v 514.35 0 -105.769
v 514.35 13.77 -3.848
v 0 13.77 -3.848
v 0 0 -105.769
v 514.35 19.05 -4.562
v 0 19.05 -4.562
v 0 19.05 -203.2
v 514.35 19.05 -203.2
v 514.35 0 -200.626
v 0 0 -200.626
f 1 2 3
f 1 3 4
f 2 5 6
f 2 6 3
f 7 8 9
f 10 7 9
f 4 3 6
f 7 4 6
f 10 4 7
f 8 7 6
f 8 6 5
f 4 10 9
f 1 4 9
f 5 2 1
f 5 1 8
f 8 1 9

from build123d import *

# Parameters (mm, degrees)
SKETCH1_W           = 514.35
SKETCH1_H           = 203.2
BOSS_EXTRUDE1_DEPTH = 19.05
CUT_EXTRUDE3_DEPTH  = 781.686405159


with BuildPart() as part:
    # Sketch1 → Boss-Extrude1 (new body)
    with BuildSketch(Plane(origin=(0, 0, 0), x_dir=(1, 0, 0), z_dir=(0, 1, 0))):
        with Locations((257.175, 101.6)):
            Rectangle(SKETCH1_W, SKETCH1_H)
    extrude(amount=BOSS_EXTRUDE1_DEPTH)

    # Sketch5 → Cut-Extrude3 (cut)
    with BuildSketch(Plane(origin=(514.35, 0, 0), x_dir=(0, 0, -1), z_dir=(1, 0, 0))):
        Polygon((0, 19.05), (4.561624762, 19.05), (3.848243249, 13.769669769), (105.769027955, 0), (0, 0), align=None)
        Polygon((203.2, 19.05), (200.626312897, 0), (203.2, 0), align=None)
    extrude(amount=-CUT_EXTRUDE3_DEPTH, mode=Mode.SUBTRACT)


solid = part.part
